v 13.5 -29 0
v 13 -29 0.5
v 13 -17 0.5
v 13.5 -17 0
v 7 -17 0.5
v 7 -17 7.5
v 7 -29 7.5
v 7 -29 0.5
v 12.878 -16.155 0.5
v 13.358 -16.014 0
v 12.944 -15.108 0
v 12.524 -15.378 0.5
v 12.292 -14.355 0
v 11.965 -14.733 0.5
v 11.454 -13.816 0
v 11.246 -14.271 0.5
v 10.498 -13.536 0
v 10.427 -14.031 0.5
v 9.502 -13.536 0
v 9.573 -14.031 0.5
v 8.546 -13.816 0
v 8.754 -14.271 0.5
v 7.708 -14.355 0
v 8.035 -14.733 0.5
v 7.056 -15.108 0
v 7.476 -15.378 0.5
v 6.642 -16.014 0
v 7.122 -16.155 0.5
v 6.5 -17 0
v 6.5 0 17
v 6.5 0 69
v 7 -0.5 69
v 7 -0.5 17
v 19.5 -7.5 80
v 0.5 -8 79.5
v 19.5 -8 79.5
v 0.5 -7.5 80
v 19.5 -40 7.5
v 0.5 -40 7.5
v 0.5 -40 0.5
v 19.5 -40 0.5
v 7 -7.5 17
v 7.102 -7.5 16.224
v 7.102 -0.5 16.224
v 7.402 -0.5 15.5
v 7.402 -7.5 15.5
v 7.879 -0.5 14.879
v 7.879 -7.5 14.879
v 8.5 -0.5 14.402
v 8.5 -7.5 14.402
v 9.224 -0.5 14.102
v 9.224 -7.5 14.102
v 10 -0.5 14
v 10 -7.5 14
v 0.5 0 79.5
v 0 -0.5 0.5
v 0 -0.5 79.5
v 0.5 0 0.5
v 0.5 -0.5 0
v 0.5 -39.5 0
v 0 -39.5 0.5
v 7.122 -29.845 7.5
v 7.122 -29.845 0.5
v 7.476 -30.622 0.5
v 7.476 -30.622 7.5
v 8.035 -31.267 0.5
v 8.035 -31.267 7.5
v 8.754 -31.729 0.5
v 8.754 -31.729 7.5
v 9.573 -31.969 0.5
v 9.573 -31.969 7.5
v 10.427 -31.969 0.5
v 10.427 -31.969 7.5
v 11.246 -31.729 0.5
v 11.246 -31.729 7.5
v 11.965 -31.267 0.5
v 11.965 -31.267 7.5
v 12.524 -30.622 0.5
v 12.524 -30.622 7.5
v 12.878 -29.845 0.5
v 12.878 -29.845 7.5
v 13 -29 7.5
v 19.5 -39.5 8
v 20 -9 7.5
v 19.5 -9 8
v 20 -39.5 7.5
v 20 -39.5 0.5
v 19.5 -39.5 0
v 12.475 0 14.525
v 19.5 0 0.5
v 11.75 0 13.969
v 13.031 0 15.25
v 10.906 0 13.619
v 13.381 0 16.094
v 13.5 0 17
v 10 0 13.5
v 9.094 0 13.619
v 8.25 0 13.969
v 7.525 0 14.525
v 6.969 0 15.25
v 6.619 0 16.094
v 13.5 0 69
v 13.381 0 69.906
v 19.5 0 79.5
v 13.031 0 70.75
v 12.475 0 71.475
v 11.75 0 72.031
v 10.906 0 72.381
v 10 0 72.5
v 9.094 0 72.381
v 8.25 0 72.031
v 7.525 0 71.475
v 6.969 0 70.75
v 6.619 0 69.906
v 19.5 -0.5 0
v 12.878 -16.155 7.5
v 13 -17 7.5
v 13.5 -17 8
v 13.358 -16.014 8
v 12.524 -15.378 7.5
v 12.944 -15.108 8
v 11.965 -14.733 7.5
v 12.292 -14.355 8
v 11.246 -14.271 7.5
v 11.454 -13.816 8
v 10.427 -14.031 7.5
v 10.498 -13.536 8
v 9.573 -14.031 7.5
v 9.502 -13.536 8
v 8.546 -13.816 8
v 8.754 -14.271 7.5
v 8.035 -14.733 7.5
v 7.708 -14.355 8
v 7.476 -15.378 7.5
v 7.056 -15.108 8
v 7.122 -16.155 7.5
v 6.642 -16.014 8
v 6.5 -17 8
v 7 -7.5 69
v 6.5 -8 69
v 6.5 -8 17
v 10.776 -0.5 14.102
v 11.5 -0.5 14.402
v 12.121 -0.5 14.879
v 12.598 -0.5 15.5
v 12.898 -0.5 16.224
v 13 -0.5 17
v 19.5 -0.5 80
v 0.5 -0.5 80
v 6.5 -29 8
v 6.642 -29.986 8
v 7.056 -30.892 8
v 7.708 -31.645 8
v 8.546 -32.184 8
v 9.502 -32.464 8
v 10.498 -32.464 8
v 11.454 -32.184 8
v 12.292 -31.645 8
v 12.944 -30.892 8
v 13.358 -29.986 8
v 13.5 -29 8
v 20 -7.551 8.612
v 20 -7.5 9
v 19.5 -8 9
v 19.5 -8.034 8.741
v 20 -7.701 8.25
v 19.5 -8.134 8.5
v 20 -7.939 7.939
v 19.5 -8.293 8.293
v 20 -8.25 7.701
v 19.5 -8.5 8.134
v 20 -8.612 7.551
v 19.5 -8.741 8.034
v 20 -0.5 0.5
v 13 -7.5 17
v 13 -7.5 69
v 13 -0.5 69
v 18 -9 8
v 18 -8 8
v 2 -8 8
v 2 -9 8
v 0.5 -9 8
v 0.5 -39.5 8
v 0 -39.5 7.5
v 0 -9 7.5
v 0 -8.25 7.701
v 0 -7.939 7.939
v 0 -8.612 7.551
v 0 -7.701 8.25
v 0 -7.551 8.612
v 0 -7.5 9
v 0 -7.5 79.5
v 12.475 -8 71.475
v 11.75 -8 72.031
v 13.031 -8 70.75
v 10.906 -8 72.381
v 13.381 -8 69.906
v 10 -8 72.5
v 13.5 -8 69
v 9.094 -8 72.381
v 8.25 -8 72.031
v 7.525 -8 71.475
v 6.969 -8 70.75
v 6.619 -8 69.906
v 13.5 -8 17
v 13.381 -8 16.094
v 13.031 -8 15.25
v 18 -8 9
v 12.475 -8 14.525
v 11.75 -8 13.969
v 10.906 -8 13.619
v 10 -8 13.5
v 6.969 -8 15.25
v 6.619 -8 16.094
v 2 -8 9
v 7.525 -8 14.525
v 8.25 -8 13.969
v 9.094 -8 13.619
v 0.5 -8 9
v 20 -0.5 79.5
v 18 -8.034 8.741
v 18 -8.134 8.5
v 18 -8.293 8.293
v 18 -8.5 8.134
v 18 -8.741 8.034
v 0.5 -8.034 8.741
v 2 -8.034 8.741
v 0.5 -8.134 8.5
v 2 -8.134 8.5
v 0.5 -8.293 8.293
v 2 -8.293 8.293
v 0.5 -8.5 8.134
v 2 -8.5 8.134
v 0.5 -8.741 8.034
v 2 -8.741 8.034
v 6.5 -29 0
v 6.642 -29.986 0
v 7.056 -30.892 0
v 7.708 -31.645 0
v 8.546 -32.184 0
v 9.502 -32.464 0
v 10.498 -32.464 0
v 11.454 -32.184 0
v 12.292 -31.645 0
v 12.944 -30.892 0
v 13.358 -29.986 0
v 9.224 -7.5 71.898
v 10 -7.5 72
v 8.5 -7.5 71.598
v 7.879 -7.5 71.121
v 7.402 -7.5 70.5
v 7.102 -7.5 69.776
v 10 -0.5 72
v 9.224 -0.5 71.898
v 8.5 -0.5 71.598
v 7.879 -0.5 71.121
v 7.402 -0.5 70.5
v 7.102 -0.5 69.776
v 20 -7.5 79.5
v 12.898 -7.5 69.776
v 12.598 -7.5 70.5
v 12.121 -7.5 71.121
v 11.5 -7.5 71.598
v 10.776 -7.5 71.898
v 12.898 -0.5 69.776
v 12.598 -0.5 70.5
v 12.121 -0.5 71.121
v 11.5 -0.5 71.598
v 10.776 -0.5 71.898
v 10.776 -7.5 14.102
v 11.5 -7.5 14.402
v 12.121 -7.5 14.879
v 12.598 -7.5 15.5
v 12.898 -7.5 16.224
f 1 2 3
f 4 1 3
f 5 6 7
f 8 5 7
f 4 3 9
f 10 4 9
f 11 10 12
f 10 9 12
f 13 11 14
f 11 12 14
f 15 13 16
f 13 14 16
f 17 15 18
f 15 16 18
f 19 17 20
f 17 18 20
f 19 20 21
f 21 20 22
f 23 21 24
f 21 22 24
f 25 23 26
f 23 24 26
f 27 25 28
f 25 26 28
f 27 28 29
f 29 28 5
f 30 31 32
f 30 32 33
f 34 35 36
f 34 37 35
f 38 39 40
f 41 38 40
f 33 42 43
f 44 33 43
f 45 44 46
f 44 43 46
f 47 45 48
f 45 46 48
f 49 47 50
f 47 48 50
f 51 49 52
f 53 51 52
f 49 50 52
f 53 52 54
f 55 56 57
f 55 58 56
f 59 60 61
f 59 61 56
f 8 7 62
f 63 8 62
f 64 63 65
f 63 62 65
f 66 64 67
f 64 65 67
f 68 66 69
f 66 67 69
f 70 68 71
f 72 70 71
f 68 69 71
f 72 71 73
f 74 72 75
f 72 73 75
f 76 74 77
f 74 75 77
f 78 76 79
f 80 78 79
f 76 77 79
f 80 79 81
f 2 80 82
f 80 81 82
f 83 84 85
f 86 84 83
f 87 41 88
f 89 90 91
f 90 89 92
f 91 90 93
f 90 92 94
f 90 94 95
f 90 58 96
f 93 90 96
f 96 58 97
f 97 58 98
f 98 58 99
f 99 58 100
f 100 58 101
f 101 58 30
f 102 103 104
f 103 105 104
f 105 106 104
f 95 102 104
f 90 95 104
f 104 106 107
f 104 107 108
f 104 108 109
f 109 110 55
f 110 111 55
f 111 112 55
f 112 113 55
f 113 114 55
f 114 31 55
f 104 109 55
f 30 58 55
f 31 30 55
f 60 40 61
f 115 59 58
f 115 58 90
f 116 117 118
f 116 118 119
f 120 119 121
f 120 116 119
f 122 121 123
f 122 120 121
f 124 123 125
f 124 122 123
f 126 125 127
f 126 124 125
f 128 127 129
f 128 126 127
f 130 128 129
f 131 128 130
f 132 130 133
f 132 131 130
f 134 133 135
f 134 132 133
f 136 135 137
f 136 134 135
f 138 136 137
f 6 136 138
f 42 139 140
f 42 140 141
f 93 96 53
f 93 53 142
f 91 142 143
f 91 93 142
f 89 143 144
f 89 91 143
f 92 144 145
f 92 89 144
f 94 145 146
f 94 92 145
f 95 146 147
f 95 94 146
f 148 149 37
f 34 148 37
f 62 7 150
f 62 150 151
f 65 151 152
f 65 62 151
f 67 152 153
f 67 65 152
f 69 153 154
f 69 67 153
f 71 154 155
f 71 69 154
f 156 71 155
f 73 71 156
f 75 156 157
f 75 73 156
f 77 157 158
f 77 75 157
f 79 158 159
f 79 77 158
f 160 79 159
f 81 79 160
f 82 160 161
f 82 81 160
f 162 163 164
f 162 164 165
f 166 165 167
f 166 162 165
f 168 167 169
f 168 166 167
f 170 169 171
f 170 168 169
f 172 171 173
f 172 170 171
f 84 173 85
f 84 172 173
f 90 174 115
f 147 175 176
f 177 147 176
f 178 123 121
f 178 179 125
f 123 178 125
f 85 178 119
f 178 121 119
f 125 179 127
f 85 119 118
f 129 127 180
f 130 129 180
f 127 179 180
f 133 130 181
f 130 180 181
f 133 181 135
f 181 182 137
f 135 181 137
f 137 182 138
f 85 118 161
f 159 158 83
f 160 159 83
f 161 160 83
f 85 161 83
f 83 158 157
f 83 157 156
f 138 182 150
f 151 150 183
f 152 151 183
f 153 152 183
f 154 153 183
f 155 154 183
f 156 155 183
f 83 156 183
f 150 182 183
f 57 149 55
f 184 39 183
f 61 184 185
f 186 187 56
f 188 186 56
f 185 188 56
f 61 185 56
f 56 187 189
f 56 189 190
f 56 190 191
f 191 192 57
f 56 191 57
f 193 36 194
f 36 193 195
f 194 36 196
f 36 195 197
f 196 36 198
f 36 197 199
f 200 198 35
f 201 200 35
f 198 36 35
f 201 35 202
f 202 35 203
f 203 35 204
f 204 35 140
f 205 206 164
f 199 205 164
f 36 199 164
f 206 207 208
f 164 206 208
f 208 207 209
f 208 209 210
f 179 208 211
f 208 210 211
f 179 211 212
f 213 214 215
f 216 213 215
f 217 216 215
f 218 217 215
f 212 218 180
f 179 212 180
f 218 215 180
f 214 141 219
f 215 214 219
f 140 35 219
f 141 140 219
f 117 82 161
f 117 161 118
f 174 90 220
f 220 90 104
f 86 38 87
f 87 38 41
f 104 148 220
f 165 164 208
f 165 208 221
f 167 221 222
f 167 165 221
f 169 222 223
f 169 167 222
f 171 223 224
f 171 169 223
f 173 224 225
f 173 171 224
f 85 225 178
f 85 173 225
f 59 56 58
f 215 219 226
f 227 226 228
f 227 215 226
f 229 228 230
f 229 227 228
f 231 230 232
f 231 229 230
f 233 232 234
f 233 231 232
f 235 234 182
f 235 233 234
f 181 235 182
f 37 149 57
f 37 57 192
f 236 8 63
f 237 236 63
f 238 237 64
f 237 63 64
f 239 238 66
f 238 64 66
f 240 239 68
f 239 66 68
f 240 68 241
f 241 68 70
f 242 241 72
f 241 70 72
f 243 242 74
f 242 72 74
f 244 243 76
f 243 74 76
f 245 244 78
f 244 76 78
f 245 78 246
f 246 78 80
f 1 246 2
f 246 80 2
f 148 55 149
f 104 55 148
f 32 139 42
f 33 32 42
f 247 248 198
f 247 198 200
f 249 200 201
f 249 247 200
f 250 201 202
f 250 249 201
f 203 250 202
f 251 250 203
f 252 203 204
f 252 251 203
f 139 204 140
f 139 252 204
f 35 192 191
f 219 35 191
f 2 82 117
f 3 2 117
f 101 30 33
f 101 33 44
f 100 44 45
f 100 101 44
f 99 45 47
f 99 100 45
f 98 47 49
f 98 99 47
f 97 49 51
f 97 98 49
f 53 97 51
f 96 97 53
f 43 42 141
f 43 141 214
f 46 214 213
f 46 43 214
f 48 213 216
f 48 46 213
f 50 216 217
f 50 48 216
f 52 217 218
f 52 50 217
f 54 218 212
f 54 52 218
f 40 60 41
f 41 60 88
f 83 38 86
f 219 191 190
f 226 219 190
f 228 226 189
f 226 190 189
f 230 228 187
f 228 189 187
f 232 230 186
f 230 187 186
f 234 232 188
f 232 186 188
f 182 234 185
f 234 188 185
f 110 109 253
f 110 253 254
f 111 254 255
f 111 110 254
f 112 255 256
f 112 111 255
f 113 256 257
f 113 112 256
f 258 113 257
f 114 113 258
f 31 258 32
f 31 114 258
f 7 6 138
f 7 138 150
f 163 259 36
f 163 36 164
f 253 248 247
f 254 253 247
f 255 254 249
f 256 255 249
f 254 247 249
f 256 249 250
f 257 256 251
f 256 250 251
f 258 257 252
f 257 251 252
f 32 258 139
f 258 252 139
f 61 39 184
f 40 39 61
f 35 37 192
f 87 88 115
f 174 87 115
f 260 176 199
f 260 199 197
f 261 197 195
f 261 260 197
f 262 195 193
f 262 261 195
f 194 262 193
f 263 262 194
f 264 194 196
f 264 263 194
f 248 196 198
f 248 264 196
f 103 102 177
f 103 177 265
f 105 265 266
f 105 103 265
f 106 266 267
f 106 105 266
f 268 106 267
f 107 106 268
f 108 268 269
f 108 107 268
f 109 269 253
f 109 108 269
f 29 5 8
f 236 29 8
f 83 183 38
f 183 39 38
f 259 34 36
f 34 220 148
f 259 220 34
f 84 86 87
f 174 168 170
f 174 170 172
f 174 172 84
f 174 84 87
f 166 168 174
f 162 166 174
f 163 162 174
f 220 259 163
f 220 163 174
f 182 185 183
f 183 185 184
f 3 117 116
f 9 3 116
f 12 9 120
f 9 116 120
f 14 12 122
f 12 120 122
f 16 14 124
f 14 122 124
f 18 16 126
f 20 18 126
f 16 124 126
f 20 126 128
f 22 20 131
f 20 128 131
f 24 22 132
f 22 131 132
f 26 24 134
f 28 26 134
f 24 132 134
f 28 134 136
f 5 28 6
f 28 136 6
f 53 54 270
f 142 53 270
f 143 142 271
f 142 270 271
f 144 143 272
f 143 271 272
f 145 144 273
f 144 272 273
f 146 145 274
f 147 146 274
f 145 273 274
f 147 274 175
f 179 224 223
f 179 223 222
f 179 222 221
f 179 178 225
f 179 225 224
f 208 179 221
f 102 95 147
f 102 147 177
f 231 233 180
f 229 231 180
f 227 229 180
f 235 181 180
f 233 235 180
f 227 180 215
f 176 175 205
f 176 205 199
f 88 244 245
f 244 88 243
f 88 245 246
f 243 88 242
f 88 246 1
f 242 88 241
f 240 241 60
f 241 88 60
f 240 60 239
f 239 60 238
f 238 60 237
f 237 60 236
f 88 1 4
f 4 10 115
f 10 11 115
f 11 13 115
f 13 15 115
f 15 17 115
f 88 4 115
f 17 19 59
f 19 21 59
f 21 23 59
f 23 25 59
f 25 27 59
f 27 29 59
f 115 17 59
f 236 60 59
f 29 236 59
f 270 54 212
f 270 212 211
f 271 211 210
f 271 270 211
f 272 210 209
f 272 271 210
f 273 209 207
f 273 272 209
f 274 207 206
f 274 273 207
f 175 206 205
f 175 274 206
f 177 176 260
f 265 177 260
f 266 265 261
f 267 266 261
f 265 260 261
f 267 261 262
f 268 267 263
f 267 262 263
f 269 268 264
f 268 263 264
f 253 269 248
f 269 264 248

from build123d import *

# Parameters (mm, degrees)
F1_DEPTH = 20
F2_R     = 1
F3_W     = 16
F3_H     = 1
F4_DEPTH = 25
F6_DEPTH = 25
F8_DEPTH = 25
F9_SIZE  = 0.5


with BuildPart() as f1:
    # F0 (on Right) → F1 (new body)
    with BuildSketch(Plane.YZ):
        Polygon((-40, 0), (0, 0), (0, 80), (-8, 80), (-8, 8), (-40, 8), align=None)
    extrude(amount=F1_DEPTH)

    # F2
    f2_edges = [f1.edges().sort_by_distance(p)[0] for p in [
        (10, -8, 8),
    ]]
    fillet(f2_edges, radius=F2_R)

    # F3 (on face) → F4 (cut)
    with BuildSketch(Plane.XY.offset(8)):
        with Locations((10, -8.5)):
            Rectangle(F3_W, F3_H)
    extrude(amount=F4_DEPTH, mode=Mode.SUBTRACT)

    # F5 (on face) → F6 (cut)
    with BuildSketch(Plane.XY.offset(8)):
        with BuildLine():
            Line((7, -17), (7, -29))
            ThreePointArc((7, -29), (10, -32), (13, -29))
            Line((13, -29), (13, -17))
            ThreePointArc((13, -17), (10, -14), (7, -17))
        make_face()
    extrude(amount=-F6_DEPTH, mode=Mode.SUBTRACT)

    # F7 (on face) → F8 (cut)
    with BuildSketch(Plane.XZ.offset(8)):
        with BuildLine():
            ThreePointArc((13, 69), (12.12132, 71.12132), (10, 72))
            Line((10, 72), (10, 14))
            ThreePointArc((10, 14), (12.12132, 14.87868), (13, 17))
            Line((13, 17), (13, 69))
        make_face()
        with BuildLine():
            Line((10, 14), (10, 72))
            ThreePointArc((10, 72), (7.87868, 71.12132), (7, 69))
            Line((7, 69), (7, 17))
            ThreePointArc((7, 17), (7.87868, 14.87868), (10, 14))
        make_face()
    extrude(amount=-F8_DEPTH, mode=Mode.SUBTRACT)

    # F9
    f9_edges = [f1.edges().sort_by_distance(p)[0] for p in [
        (10, 0, 80),
        (10, -8, 80),
        (0, -4, 80),
        (20, -4, 80),
        (10, -40, 8),
        (10, -40, 0),
        (0, -40, 4),
        (20, -40, 4),
        (20, -8, 44.5),
        (20, -8.292893, 8.292893),
        (20, -24.5, 8),
        (20, 0, 40),
        (20, -20, 0),
        (0, -8, 44.5),
        (0, -8.292893, 8.292893),
        (0, -24.5, 8),
        (0, 0, 40),
        (0, -20, 0),
        (7, -8, 43),
        (7, 0, 43),
        (7, -23, 0),
        (7, -23, 8),
        (10, 0, 0),
    ]]
    chamfer(f9_edges, length=F9_SIZE)


solid = f1.part
